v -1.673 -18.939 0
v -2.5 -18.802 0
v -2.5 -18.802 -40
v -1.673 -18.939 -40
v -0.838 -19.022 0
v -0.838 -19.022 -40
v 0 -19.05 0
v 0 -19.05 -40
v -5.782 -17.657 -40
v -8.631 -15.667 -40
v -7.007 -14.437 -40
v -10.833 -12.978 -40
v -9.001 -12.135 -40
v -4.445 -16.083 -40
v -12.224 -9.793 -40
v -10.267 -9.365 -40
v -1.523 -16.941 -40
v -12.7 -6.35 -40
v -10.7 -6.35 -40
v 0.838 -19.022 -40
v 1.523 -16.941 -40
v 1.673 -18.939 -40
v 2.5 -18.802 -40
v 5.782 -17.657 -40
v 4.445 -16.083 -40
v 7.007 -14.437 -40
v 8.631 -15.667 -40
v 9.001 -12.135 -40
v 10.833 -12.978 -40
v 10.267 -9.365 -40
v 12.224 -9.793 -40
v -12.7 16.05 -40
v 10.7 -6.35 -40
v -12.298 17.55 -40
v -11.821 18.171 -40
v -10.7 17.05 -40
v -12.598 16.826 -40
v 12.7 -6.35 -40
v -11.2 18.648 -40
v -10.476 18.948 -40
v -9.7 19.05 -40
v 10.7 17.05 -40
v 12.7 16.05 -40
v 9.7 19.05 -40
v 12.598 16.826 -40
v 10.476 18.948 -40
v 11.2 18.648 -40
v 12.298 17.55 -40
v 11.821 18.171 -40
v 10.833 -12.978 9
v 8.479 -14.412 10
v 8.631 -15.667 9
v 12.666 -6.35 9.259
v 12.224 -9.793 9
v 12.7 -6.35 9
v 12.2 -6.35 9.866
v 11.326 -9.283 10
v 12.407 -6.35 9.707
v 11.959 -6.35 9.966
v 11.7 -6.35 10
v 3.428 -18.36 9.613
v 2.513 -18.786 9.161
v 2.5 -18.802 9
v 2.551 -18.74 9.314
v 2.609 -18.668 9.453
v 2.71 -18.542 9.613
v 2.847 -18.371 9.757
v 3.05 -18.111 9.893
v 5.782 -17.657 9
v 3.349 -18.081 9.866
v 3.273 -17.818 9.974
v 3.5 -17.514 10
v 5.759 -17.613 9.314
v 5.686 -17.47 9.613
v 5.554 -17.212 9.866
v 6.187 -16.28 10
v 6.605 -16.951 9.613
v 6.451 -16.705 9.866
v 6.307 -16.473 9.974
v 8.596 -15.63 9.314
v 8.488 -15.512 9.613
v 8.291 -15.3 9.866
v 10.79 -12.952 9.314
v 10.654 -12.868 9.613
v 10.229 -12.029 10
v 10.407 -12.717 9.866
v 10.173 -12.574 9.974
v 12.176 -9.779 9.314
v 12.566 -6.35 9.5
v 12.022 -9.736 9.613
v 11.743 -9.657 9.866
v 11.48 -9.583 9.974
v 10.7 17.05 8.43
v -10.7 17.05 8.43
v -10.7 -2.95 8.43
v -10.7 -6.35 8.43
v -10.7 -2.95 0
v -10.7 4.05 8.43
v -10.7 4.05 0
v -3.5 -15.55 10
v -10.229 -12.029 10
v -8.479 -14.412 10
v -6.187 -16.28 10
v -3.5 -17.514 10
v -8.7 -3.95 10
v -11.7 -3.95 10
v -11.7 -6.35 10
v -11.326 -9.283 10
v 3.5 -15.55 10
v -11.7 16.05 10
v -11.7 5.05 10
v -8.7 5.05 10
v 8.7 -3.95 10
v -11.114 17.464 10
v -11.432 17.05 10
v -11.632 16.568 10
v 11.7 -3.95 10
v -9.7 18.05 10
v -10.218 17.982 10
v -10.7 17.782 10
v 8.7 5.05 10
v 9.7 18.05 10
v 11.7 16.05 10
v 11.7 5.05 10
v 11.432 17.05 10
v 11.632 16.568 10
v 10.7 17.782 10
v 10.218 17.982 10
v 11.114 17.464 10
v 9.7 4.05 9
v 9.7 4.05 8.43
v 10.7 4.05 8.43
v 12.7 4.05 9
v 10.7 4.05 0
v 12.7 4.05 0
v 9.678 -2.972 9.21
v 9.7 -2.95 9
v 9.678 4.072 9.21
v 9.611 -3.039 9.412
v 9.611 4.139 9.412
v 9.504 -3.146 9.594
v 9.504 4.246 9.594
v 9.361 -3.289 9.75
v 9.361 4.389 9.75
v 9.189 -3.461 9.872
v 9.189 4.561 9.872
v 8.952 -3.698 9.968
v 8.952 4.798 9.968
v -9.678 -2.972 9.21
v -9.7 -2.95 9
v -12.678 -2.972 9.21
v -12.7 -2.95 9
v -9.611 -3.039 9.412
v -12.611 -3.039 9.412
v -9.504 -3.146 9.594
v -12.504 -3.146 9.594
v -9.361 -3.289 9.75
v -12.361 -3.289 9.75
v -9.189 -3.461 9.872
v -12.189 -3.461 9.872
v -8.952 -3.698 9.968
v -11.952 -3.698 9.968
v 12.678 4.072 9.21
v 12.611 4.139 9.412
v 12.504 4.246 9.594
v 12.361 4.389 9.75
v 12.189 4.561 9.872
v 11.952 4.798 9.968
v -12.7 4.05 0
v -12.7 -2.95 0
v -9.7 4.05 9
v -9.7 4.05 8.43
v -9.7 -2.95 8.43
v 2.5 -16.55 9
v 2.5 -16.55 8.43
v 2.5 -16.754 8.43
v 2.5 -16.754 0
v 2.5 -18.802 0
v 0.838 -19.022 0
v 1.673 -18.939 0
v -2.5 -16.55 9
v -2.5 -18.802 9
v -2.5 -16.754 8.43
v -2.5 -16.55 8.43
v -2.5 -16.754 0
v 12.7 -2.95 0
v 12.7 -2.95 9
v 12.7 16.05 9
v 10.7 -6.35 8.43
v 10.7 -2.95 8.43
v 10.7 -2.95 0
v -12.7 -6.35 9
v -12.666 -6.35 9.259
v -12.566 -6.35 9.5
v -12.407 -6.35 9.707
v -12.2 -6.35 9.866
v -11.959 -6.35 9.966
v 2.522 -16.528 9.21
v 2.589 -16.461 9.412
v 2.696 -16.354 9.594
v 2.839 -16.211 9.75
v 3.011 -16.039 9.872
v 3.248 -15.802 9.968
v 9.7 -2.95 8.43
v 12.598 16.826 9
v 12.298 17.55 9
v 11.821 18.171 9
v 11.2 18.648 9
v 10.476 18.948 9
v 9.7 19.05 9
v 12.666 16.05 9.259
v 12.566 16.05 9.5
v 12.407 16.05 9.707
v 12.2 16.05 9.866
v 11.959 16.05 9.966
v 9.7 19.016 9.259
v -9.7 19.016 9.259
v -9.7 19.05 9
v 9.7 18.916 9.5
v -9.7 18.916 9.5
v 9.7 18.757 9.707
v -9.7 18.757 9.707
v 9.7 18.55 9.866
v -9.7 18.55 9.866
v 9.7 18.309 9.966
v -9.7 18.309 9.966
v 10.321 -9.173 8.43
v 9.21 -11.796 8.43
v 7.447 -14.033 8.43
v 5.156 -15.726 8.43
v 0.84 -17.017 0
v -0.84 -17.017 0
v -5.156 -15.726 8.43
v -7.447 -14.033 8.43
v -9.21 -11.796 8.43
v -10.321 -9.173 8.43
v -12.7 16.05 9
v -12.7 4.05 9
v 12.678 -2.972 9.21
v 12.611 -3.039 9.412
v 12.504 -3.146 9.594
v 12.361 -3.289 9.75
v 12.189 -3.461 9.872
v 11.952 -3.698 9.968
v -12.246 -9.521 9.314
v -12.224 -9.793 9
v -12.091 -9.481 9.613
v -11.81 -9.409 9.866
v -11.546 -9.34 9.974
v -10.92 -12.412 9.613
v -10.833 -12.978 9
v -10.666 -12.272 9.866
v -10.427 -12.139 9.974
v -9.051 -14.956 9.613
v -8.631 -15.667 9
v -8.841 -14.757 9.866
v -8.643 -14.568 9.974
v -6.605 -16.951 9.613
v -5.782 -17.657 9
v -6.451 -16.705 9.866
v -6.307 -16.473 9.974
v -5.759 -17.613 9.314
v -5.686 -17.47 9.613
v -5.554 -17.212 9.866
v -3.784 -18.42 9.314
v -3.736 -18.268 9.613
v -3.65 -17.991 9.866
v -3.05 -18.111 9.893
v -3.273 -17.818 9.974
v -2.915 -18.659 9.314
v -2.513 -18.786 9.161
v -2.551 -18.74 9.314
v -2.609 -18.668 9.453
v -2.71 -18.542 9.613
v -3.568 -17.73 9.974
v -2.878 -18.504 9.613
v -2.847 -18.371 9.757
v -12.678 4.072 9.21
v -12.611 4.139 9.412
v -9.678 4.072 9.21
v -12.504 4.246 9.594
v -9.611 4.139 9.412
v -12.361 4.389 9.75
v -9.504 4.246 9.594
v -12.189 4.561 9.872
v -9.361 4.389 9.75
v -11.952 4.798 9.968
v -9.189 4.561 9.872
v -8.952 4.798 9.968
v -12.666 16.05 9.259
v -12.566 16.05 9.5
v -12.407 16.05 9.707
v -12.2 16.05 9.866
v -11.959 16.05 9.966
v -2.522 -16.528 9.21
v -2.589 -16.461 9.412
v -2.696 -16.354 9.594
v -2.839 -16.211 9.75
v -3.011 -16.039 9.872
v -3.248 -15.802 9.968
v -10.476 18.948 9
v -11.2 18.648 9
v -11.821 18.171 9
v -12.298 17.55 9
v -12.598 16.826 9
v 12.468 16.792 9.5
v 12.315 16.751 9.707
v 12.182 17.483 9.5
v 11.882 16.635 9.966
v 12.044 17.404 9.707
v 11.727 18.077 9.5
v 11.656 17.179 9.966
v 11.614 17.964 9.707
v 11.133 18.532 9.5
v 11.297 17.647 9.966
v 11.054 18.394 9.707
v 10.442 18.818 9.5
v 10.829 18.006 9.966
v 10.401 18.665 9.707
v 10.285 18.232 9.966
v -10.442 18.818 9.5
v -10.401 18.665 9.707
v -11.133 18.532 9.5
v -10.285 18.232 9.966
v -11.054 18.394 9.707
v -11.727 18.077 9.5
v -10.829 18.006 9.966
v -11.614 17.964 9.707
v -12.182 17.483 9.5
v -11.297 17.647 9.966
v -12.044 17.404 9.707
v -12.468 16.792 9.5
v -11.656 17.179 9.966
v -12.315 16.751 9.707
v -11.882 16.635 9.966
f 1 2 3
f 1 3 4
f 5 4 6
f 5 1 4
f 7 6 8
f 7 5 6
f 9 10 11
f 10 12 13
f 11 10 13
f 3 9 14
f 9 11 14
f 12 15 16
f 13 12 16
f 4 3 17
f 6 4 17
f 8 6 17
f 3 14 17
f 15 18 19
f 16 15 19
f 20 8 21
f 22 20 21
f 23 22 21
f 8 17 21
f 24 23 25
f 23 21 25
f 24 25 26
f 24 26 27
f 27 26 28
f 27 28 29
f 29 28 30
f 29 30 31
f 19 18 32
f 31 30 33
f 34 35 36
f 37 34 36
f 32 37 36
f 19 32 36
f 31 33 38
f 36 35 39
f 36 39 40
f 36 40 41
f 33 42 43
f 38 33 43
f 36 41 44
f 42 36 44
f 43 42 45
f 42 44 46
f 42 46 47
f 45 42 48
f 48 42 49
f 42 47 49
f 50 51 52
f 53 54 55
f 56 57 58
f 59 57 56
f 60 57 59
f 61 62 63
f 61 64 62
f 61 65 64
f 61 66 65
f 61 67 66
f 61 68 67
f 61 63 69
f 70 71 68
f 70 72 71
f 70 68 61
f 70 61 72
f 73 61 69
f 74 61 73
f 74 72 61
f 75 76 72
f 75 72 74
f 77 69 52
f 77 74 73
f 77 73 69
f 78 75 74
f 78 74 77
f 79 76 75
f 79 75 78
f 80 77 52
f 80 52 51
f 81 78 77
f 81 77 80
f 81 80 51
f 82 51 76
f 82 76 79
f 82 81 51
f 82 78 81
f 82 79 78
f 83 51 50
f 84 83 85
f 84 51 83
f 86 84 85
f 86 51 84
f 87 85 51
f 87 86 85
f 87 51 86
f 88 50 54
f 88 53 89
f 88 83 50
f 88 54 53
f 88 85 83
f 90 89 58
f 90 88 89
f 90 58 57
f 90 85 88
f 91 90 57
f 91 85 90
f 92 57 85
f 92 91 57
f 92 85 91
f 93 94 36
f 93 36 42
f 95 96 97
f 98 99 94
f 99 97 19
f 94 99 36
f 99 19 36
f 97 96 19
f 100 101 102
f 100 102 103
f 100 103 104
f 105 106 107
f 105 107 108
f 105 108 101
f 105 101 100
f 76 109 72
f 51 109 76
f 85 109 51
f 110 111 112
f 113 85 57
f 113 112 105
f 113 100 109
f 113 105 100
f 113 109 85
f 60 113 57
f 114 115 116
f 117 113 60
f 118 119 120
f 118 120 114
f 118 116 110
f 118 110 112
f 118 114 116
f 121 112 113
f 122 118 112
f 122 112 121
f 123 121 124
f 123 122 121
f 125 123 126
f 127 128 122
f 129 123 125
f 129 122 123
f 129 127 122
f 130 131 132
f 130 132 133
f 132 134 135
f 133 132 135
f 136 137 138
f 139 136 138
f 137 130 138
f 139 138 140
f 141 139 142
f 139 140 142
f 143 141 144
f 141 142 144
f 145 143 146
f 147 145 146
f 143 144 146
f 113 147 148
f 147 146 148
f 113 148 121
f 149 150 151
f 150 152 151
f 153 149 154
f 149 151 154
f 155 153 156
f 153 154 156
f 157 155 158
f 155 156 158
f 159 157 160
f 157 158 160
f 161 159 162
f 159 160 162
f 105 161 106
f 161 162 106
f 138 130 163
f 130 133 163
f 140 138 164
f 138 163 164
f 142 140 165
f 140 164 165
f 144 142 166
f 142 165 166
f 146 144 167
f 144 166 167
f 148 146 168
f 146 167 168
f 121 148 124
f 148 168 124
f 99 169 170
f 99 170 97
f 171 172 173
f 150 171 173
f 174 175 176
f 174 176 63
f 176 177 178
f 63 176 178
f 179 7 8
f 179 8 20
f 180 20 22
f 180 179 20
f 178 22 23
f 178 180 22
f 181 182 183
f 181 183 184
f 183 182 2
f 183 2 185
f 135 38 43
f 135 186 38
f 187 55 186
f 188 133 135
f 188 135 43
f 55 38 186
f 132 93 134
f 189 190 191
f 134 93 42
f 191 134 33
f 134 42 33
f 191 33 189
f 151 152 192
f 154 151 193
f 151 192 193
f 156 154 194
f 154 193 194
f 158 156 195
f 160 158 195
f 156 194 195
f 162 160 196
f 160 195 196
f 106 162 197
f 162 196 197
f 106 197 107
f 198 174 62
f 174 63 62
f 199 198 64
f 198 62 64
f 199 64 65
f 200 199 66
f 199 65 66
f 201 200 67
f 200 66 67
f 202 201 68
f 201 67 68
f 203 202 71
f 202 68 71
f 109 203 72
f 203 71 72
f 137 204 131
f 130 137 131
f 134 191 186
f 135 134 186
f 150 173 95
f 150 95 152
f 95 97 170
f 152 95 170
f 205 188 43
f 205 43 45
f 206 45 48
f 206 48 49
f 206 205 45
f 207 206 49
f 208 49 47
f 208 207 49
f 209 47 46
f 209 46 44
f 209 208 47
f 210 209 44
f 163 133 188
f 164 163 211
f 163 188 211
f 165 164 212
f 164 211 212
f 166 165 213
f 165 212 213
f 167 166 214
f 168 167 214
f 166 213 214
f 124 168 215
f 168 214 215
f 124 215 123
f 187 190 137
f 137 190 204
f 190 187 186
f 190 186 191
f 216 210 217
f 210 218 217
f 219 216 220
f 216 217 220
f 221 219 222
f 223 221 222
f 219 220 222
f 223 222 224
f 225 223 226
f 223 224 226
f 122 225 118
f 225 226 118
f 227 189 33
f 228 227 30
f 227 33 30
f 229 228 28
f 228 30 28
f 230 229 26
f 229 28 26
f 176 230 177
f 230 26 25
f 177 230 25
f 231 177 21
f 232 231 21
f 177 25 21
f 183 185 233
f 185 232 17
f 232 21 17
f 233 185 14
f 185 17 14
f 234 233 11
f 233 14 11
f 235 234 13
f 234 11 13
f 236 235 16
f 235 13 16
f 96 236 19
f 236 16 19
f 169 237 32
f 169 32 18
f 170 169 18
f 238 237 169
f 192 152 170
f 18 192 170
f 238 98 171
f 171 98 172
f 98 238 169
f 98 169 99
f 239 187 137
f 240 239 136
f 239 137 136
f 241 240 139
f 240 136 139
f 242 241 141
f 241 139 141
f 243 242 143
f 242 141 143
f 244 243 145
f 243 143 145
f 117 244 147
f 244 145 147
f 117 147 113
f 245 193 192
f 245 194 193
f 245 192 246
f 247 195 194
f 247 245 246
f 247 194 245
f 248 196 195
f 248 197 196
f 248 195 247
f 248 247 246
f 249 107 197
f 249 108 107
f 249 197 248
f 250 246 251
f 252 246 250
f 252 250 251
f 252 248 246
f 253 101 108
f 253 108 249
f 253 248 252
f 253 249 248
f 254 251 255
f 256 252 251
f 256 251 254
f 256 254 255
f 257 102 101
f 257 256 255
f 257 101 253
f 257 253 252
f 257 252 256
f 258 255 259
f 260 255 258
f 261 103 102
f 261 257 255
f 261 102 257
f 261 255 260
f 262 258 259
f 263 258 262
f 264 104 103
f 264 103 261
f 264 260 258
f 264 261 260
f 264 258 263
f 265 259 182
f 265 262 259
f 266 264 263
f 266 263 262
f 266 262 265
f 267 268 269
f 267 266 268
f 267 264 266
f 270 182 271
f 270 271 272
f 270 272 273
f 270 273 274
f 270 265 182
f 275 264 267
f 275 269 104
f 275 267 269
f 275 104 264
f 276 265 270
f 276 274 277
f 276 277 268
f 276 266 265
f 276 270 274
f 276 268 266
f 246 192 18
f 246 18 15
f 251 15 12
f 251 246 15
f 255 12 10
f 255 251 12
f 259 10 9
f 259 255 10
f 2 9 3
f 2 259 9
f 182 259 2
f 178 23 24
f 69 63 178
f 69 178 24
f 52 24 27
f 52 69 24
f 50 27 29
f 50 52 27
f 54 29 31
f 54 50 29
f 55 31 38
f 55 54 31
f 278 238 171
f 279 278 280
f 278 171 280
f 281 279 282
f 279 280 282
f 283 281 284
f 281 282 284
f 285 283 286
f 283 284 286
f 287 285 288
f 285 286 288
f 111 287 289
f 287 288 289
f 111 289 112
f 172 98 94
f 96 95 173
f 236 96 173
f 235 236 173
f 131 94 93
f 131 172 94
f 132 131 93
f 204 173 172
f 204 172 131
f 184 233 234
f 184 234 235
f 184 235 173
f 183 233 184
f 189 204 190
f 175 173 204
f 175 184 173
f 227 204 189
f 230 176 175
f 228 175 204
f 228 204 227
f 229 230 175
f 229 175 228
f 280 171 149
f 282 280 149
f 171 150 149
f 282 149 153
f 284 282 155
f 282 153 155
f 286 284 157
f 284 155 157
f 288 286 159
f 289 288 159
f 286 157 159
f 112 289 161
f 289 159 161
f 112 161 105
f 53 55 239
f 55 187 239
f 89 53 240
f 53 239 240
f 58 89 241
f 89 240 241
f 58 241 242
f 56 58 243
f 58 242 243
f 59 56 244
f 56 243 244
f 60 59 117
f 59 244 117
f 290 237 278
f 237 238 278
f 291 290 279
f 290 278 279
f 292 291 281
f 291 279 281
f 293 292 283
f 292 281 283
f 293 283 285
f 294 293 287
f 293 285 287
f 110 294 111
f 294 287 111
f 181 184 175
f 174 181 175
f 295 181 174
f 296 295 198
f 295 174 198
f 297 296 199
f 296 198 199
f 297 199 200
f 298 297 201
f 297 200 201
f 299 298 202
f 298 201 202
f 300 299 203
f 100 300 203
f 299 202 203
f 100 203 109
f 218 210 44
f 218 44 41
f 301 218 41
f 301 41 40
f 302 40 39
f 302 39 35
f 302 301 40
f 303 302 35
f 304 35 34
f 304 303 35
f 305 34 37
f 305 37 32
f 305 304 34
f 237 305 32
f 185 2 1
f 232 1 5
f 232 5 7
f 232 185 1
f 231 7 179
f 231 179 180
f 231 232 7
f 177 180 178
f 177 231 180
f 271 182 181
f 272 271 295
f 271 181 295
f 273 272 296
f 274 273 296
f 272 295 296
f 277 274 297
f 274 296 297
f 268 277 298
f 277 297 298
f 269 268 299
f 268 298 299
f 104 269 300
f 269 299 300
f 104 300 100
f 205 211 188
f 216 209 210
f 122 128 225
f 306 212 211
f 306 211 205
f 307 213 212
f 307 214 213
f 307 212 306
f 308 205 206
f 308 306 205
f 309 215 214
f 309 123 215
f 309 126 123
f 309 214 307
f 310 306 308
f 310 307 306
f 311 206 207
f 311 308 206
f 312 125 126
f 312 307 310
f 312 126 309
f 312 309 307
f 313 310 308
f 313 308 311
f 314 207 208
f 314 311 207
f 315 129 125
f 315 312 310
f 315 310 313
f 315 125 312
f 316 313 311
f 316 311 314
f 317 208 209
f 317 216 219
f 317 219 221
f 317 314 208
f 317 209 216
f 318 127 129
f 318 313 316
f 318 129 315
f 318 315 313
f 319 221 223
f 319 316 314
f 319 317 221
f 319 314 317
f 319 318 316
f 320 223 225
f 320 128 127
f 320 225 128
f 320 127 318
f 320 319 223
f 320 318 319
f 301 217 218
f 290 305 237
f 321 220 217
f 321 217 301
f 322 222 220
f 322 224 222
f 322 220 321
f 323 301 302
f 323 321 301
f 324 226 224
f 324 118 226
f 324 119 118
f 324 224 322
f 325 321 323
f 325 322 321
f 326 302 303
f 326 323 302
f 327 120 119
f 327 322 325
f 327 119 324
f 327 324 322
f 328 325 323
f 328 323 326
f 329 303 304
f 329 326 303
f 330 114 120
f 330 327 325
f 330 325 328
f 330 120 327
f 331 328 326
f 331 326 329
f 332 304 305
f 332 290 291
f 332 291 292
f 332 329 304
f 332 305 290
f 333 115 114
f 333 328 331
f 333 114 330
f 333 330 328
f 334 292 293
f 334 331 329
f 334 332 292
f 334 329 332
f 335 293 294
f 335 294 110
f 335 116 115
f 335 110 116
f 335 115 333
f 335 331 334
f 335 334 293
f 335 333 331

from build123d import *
from build123d import SkipClean  # not in build123d's __all__

# Parameters (mm, degrees)
F1_DEPTH = 10
F0_W     = 3
F0_H     = 7
F2_DEPTH = 40
F4_DEPTH = 48.42995
F5_R     = 1


# Not quite as in the source:
# - after a boolean that leaves OpenCascade's solid faulty, fix() repairs it


with BuildPart() as f1:
    # F0 (on Top) → F1 (new body)
    with BuildSketch(Plane.XY):
        with BuildLine():
            ThreePointArc((12.7, 16.05), (11.8213203436, 18.1713203436), (9.7, 19.05))
            Line((9.7, 19.05), (-9.7, 19.05))
            ThreePointArc((-9.7, 19.05), (-11.8213203436, 18.1713203436), (-12.7, 16.05))
            Line((-12.7, 16.05), (-12.7, 4.05))
            Line((-12.7, 4.05), (-9.7, 4.05))
            Line((-9.7, 4.05), (-9.7, -2.95))
            Line((-9.7, -2.95), (-12.7, -2.95))
            Line((-12.7, -2.95), (-12.7, -6.35))
            ThreePointArc((-12.7, -6.35), (-9.8244592727, -14.3979811133), (-2.5, -18.801505933))
            Line((-2.5, -18.801505933), (-2.5, -16.55))
            Line((-2.5, -16.55), (2.5, -16.55))
            Line((2.5, -16.55), (2.5, -18.801505933))
            ThreePointArc((2.5, -18.801505933), (9.8244592727, -14.3979811133), (12.7, -6.35))
            Line((12.7, -6.35), (12.7, -2.95))
            Line((12.7, -2.95), (9.7, -2.95))
            Line((9.7, -2.95), (9.7, 4.05))
            Line((9.7, 4.05), (12.7, 4.05))
            Line((12.7, 4.05), (12.7, 16.05))
        make_face()
    extrude(amount=F1_DEPTH)

    # F0 (on Top) → F2 (join)
    with BuildSketch(Plane.XY):
        with BuildLine():
            ThreePointArc((12.7, 16.05), (11.8213203436, 18.1713203436), (9.7, 19.05))
            Line((9.7, 19.05), (-9.7, 19.05))
            ThreePointArc((-9.7, 19.05), (-11.8213203436, 18.1713203436), (-12.7, 16.05))
            Line((-12.7, 16.05), (-12.7, 4.05))
            Line((-12.7, 4.05), (-9.7, 4.05))
            Line((-9.7, 4.05), (-9.7, -2.95))
            Line((-9.7, -2.95), (-12.7, -2.95))
            Line((-12.7, -2.95), (-12.7, -6.35))
            ThreePointArc((-12.7, -6.35), (-9.8244592727, -14.3979811133), (-2.5, -18.801505933))
            Line((-2.5, -18.801505933), (-2.5, -16.55))
            Line((-2.5, -16.55), (2.5, -16.55))
            Line((2.5, -16.55), (2.5, -18.801505933))
            ThreePointArc((2.5, -18.801505933), (9.8244592727, -14.3979811133), (12.7, -6.35))
            Line((12.7, -6.35), (12.7, -2.95))
            Line((12.7, -2.95), (9.7, -2.95))
            Line((9.7, -2.95), (9.7, 4.05))
            Line((9.7, 4.05), (12.7, 4.05))
            Line((12.7, 4.05), (12.7, 16.05))
        make_face()
        with Locations((11.2, 0.55)):
            Rectangle(F0_W, F0_H)
        with BuildLine():
            ThreePointArc((0, -19.05), (1.2561597531, -18.9877237933), (2.5, -18.801505933))
            Line((2.5, -18.801505933), (2.5, -16.55))
            Line((2.5, -16.55), (-2.5, -16.55))
            Line((-2.5, -16.55), (-2.5, -18.801505933))
            ThreePointArc((-2.5, -18.801505933), (-1.2561597531, -18.9877237933), (0, -19.05))
        make_face()
        with Locations((-11.2, 0.55)):
            Rectangle(F0_W, F0_H)
    with SkipClean():  # cleaning this boolean's faces spoils the solid; the shape is the same uncleaned
        extrude(amount=-F2_DEPTH)

    # F3 (on face) → F4 (cut)
    with BuildSketch(Plane(origin=(0, 0, -40), x_dir=(1, 0, 0), z_dir=(0, 0, -1))):
        with BuildLine():
            ThreePointArc((10.7, 6.35), (0, 17.05), (-10.7, 6.35))
            Line((-10.7, 6.35), (-10.7, -17.05))
            Line((-10.7, -17.05), (10.7, -17.05))
            Line((10.7, -17.05), (10.7, 6.35))
        make_face()
    extrude(amount=-F4_DEPTH, mode=Mode.SUBTRACT)

    add(f1.part.fix(), mode=Mode.REPLACE)

    # F5
    f5_edges = [f1.edges().sort_by_distance(p)[0] for p in [
        (9.824459, -14.397981, 10),
        (12.7, -4.65, 10),
        (11.2, -2.95, 10),
        (9.7, 0.55, 10),
        (11.2, 4.05, 10),
        (12.7, 10.05, 10),
        (11.82132, 18.17132, 10),
        (0, 19.05, 10),
        (-11.82132, 18.17132, 10),
        (-12.7, 10.05, 10),
        (-11.2, 4.05, 10),
        (-9.7, 0.55, 10),
        (-11.2, -2.95, 10),
        (-12.7, -4.65, 10),
        (-9.824459, -14.397981, 10),
        (-2.5, -17.675753, 10),
        (0, -16.55, 10),
        (2.5, -17.675753, 10),
    ]]
    fillet(f5_edges, radius=F5_R)


solid = f1.part
